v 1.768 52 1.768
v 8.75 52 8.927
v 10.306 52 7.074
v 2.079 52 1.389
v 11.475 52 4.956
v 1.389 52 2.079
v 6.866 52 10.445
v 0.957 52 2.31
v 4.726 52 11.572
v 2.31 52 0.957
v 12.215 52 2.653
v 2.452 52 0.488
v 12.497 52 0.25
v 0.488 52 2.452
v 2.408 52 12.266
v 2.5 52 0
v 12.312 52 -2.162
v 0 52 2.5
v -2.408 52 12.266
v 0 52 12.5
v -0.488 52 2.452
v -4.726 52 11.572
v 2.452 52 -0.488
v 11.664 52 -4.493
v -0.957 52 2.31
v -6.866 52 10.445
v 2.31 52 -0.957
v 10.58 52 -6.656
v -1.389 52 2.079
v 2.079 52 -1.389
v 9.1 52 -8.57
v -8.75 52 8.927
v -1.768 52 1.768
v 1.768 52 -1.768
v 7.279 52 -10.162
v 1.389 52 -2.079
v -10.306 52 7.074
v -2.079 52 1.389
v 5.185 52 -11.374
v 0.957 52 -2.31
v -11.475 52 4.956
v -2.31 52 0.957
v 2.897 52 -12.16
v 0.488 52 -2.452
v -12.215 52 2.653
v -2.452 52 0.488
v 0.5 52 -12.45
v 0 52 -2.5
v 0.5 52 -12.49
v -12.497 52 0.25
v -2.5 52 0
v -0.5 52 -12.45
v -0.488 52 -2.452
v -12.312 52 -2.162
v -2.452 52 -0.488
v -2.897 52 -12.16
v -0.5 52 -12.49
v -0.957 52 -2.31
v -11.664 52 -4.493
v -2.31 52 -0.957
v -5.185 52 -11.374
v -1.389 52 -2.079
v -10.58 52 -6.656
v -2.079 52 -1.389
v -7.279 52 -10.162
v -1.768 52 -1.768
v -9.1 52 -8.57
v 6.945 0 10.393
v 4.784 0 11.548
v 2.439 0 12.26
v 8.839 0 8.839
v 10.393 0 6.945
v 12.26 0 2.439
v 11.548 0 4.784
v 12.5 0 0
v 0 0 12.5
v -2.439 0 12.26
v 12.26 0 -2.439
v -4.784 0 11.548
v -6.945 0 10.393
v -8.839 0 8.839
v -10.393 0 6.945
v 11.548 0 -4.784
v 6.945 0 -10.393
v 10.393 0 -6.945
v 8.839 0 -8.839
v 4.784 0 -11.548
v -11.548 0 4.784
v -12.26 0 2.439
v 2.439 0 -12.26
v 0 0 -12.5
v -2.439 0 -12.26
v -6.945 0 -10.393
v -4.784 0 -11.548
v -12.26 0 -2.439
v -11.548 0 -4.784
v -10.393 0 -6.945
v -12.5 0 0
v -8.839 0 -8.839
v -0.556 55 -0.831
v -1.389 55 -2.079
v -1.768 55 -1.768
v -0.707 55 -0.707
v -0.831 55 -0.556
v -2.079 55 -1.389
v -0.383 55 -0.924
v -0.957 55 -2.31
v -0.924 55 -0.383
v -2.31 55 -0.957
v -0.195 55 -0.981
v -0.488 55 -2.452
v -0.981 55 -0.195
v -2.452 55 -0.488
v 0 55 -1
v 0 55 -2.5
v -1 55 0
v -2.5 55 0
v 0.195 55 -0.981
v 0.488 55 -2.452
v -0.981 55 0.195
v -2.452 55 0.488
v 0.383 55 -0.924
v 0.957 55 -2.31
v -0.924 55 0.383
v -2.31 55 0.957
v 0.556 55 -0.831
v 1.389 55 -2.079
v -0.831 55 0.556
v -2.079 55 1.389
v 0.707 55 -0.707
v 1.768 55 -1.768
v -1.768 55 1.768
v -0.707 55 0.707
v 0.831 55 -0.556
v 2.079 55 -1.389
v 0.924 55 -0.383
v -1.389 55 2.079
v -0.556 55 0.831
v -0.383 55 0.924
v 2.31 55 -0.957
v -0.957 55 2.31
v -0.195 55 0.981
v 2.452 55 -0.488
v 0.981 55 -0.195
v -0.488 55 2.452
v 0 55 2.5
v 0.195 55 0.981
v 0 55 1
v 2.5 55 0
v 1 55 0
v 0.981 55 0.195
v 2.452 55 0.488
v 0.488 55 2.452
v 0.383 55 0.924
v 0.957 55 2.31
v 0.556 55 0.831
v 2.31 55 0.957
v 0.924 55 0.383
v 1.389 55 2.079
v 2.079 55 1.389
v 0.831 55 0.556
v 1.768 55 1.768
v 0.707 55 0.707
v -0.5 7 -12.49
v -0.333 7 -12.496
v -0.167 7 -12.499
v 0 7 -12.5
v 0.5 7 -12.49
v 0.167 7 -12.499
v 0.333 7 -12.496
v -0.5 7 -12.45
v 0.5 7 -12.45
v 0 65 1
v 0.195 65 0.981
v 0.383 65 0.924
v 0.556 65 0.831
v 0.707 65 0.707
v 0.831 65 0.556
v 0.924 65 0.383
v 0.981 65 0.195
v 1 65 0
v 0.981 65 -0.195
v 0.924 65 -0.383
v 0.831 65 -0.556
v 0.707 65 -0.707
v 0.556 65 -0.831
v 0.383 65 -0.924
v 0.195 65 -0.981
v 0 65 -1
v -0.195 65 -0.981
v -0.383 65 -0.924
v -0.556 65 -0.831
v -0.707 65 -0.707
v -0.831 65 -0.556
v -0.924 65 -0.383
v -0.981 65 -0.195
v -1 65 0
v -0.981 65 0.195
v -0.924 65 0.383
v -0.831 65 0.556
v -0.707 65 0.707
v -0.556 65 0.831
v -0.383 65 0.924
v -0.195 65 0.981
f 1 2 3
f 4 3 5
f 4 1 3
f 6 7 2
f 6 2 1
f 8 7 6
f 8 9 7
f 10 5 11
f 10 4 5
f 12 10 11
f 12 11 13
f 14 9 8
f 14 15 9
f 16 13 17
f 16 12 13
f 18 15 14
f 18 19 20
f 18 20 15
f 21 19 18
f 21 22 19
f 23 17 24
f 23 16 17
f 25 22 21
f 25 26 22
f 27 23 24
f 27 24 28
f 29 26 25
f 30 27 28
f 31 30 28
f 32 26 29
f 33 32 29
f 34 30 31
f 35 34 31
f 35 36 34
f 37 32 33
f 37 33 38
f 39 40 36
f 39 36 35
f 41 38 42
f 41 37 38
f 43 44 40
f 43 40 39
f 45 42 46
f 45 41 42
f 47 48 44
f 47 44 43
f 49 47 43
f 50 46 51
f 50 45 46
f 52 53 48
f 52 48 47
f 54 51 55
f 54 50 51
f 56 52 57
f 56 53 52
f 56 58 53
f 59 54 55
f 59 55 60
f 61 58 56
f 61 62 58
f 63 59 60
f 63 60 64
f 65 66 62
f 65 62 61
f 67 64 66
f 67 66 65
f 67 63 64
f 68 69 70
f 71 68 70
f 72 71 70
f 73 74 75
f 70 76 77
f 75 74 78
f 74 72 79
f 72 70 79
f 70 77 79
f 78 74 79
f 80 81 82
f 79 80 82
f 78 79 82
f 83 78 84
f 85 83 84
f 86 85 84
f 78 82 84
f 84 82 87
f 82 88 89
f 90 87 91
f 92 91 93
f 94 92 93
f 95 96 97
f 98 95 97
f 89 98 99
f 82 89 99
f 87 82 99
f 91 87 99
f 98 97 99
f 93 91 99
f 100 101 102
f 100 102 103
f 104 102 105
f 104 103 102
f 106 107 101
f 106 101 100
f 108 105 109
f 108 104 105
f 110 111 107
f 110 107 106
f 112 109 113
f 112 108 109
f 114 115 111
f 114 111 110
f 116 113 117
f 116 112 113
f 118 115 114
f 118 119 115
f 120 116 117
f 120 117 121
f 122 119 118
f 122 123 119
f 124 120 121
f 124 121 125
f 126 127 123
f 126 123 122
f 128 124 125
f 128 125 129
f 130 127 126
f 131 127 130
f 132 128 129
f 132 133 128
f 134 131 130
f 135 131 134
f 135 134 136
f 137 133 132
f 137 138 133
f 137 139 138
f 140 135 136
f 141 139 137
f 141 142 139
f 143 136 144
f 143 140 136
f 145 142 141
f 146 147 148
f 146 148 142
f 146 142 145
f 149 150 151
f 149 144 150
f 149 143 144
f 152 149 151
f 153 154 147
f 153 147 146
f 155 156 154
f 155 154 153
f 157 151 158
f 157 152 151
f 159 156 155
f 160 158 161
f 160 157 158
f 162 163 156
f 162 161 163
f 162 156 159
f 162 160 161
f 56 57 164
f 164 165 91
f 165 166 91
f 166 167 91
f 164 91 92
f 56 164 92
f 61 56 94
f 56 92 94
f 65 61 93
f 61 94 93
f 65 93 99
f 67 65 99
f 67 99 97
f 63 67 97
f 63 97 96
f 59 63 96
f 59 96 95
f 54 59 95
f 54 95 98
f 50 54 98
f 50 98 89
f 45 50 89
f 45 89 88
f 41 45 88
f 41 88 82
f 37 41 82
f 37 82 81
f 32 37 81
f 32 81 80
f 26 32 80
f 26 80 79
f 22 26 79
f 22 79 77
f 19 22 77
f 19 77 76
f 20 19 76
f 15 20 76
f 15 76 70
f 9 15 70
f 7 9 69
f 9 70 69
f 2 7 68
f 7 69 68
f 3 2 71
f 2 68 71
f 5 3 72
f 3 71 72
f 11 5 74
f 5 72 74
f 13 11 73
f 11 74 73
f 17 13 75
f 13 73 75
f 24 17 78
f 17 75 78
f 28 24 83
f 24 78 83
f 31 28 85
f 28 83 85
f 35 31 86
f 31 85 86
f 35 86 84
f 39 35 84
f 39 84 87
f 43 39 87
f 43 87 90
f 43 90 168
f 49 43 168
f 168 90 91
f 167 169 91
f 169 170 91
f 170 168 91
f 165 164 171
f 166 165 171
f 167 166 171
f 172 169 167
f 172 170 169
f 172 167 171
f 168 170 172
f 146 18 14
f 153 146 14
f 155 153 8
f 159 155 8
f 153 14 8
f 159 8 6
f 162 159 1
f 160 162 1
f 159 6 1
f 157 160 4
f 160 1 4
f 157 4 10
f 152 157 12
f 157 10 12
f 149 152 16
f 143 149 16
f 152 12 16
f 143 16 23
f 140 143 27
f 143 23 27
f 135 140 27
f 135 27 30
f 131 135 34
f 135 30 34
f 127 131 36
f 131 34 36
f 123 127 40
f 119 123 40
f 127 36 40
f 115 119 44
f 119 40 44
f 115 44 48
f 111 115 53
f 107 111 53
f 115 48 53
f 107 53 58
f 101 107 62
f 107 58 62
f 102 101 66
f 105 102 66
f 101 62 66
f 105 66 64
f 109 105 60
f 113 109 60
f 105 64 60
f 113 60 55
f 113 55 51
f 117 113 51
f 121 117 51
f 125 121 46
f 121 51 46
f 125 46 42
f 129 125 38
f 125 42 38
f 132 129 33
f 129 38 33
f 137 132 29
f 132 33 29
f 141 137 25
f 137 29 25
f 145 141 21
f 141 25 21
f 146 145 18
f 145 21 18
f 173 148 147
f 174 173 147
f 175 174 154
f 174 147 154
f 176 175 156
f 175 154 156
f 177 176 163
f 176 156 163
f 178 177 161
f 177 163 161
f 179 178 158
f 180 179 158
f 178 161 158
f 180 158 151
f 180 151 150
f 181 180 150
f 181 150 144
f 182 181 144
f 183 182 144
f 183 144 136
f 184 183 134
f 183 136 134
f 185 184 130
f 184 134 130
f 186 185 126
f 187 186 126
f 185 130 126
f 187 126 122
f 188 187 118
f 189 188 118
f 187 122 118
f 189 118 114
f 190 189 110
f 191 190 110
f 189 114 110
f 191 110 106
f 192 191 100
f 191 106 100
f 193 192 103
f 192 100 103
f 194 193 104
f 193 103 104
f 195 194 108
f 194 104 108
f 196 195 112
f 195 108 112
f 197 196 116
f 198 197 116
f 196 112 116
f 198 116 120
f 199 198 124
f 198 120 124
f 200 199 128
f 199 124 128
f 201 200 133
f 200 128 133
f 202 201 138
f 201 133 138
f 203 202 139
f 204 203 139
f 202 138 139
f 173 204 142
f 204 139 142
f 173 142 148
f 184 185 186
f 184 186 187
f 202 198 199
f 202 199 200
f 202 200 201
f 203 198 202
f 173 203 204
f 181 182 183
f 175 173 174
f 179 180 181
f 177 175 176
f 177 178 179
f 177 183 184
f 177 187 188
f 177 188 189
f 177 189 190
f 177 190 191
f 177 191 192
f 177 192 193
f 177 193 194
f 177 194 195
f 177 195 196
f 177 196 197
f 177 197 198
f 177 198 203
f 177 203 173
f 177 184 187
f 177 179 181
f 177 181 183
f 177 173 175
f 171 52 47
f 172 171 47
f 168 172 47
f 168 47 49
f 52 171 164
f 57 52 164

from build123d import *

# Parameters (mm, degrees)
CROQUIS1_R              = 12.5
SALIENTE_EXTRUIR1_DEPTH = 52
CROQUIS2_R              = 2.5
SALIENTE_EXTRUIR2_DEPTH = 3
CROQUIS3_R              = 1
SALIENTE_EXTRUIR3_DEPTH = 10
CROQUIS4_W              = 0.1
CROQUIS4_H              = 0.1
CORTAR_EXTRUIR1_DEPTH   = 0.1
CROQUIS5_W              = 1
CROQUIS5_H              = 0.1
CORTAR_EXTRUIR2_DEPTH   = 45


with BuildPart() as part:
    # Croquis1 → Saliente-Extruir1 (new body)
    with BuildSketch(Plane(origin=(0, 0, 0), x_dir=(1, 0, 0), z_dir=(0, 1, 0))):
        with Locations(Location((0, 0, 0), (0, 0, 90))):
            Circle(CROQUIS1_R)
    extrude(amount=SALIENTE_EXTRUIR1_DEPTH)

    # Croquis2 → Saliente-Extruir2 (add)
    with BuildSketch(Plane(origin=(0, 52, 0), x_dir=(1, 0, 0), z_dir=(0, 1, 0))):
        with Locations(Location((0, 0, 0), (0, 0, 270))):
            Circle(CROQUIS2_R)
    extrude(amount=SALIENTE_EXTRUIR2_DEPTH)

    # Croquis3 → Saliente-Extruir3 (add)
    with BuildSketch(Plane(origin=(0, 55, 0), x_dir=(1, 0, 0), z_dir=(0, 1, 0))):
        with Locations(Location((0, 0, 0), (0, 0, 270))):
            Circle(CROQUIS3_R)
    extrude(amount=SALIENTE_EXTRUIR3_DEPTH)

    # Croquis4 → Cortar-Extruir1 (cut)
    with BuildSketch(Plane(origin=(0, 52, 0), x_dir=(1, 0, 0), z_dir=(0, 1, 0))):
        with Locations((0, 12.5)):
            Rectangle(CROQUIS4_W, CROQUIS4_H)
    extrude(amount=-CORTAR_EXTRUIR1_DEPTH, mode=Mode.SUBTRACT)

    # Croquis5 → Cortar-Extruir2 (cut)
    with BuildSketch(Plane(origin=(0, 52, 0), x_dir=(1, 0, 0), z_dir=(0, 1, 0))):
        with Locations((0, 12.5)):
            Rectangle(CROQUIS5_W, CROQUIS5_H)
    extrude(amount=-CORTAR_EXTRUIR2_DEPTH, mode=Mode.SUBTRACT)


solid = part.part
